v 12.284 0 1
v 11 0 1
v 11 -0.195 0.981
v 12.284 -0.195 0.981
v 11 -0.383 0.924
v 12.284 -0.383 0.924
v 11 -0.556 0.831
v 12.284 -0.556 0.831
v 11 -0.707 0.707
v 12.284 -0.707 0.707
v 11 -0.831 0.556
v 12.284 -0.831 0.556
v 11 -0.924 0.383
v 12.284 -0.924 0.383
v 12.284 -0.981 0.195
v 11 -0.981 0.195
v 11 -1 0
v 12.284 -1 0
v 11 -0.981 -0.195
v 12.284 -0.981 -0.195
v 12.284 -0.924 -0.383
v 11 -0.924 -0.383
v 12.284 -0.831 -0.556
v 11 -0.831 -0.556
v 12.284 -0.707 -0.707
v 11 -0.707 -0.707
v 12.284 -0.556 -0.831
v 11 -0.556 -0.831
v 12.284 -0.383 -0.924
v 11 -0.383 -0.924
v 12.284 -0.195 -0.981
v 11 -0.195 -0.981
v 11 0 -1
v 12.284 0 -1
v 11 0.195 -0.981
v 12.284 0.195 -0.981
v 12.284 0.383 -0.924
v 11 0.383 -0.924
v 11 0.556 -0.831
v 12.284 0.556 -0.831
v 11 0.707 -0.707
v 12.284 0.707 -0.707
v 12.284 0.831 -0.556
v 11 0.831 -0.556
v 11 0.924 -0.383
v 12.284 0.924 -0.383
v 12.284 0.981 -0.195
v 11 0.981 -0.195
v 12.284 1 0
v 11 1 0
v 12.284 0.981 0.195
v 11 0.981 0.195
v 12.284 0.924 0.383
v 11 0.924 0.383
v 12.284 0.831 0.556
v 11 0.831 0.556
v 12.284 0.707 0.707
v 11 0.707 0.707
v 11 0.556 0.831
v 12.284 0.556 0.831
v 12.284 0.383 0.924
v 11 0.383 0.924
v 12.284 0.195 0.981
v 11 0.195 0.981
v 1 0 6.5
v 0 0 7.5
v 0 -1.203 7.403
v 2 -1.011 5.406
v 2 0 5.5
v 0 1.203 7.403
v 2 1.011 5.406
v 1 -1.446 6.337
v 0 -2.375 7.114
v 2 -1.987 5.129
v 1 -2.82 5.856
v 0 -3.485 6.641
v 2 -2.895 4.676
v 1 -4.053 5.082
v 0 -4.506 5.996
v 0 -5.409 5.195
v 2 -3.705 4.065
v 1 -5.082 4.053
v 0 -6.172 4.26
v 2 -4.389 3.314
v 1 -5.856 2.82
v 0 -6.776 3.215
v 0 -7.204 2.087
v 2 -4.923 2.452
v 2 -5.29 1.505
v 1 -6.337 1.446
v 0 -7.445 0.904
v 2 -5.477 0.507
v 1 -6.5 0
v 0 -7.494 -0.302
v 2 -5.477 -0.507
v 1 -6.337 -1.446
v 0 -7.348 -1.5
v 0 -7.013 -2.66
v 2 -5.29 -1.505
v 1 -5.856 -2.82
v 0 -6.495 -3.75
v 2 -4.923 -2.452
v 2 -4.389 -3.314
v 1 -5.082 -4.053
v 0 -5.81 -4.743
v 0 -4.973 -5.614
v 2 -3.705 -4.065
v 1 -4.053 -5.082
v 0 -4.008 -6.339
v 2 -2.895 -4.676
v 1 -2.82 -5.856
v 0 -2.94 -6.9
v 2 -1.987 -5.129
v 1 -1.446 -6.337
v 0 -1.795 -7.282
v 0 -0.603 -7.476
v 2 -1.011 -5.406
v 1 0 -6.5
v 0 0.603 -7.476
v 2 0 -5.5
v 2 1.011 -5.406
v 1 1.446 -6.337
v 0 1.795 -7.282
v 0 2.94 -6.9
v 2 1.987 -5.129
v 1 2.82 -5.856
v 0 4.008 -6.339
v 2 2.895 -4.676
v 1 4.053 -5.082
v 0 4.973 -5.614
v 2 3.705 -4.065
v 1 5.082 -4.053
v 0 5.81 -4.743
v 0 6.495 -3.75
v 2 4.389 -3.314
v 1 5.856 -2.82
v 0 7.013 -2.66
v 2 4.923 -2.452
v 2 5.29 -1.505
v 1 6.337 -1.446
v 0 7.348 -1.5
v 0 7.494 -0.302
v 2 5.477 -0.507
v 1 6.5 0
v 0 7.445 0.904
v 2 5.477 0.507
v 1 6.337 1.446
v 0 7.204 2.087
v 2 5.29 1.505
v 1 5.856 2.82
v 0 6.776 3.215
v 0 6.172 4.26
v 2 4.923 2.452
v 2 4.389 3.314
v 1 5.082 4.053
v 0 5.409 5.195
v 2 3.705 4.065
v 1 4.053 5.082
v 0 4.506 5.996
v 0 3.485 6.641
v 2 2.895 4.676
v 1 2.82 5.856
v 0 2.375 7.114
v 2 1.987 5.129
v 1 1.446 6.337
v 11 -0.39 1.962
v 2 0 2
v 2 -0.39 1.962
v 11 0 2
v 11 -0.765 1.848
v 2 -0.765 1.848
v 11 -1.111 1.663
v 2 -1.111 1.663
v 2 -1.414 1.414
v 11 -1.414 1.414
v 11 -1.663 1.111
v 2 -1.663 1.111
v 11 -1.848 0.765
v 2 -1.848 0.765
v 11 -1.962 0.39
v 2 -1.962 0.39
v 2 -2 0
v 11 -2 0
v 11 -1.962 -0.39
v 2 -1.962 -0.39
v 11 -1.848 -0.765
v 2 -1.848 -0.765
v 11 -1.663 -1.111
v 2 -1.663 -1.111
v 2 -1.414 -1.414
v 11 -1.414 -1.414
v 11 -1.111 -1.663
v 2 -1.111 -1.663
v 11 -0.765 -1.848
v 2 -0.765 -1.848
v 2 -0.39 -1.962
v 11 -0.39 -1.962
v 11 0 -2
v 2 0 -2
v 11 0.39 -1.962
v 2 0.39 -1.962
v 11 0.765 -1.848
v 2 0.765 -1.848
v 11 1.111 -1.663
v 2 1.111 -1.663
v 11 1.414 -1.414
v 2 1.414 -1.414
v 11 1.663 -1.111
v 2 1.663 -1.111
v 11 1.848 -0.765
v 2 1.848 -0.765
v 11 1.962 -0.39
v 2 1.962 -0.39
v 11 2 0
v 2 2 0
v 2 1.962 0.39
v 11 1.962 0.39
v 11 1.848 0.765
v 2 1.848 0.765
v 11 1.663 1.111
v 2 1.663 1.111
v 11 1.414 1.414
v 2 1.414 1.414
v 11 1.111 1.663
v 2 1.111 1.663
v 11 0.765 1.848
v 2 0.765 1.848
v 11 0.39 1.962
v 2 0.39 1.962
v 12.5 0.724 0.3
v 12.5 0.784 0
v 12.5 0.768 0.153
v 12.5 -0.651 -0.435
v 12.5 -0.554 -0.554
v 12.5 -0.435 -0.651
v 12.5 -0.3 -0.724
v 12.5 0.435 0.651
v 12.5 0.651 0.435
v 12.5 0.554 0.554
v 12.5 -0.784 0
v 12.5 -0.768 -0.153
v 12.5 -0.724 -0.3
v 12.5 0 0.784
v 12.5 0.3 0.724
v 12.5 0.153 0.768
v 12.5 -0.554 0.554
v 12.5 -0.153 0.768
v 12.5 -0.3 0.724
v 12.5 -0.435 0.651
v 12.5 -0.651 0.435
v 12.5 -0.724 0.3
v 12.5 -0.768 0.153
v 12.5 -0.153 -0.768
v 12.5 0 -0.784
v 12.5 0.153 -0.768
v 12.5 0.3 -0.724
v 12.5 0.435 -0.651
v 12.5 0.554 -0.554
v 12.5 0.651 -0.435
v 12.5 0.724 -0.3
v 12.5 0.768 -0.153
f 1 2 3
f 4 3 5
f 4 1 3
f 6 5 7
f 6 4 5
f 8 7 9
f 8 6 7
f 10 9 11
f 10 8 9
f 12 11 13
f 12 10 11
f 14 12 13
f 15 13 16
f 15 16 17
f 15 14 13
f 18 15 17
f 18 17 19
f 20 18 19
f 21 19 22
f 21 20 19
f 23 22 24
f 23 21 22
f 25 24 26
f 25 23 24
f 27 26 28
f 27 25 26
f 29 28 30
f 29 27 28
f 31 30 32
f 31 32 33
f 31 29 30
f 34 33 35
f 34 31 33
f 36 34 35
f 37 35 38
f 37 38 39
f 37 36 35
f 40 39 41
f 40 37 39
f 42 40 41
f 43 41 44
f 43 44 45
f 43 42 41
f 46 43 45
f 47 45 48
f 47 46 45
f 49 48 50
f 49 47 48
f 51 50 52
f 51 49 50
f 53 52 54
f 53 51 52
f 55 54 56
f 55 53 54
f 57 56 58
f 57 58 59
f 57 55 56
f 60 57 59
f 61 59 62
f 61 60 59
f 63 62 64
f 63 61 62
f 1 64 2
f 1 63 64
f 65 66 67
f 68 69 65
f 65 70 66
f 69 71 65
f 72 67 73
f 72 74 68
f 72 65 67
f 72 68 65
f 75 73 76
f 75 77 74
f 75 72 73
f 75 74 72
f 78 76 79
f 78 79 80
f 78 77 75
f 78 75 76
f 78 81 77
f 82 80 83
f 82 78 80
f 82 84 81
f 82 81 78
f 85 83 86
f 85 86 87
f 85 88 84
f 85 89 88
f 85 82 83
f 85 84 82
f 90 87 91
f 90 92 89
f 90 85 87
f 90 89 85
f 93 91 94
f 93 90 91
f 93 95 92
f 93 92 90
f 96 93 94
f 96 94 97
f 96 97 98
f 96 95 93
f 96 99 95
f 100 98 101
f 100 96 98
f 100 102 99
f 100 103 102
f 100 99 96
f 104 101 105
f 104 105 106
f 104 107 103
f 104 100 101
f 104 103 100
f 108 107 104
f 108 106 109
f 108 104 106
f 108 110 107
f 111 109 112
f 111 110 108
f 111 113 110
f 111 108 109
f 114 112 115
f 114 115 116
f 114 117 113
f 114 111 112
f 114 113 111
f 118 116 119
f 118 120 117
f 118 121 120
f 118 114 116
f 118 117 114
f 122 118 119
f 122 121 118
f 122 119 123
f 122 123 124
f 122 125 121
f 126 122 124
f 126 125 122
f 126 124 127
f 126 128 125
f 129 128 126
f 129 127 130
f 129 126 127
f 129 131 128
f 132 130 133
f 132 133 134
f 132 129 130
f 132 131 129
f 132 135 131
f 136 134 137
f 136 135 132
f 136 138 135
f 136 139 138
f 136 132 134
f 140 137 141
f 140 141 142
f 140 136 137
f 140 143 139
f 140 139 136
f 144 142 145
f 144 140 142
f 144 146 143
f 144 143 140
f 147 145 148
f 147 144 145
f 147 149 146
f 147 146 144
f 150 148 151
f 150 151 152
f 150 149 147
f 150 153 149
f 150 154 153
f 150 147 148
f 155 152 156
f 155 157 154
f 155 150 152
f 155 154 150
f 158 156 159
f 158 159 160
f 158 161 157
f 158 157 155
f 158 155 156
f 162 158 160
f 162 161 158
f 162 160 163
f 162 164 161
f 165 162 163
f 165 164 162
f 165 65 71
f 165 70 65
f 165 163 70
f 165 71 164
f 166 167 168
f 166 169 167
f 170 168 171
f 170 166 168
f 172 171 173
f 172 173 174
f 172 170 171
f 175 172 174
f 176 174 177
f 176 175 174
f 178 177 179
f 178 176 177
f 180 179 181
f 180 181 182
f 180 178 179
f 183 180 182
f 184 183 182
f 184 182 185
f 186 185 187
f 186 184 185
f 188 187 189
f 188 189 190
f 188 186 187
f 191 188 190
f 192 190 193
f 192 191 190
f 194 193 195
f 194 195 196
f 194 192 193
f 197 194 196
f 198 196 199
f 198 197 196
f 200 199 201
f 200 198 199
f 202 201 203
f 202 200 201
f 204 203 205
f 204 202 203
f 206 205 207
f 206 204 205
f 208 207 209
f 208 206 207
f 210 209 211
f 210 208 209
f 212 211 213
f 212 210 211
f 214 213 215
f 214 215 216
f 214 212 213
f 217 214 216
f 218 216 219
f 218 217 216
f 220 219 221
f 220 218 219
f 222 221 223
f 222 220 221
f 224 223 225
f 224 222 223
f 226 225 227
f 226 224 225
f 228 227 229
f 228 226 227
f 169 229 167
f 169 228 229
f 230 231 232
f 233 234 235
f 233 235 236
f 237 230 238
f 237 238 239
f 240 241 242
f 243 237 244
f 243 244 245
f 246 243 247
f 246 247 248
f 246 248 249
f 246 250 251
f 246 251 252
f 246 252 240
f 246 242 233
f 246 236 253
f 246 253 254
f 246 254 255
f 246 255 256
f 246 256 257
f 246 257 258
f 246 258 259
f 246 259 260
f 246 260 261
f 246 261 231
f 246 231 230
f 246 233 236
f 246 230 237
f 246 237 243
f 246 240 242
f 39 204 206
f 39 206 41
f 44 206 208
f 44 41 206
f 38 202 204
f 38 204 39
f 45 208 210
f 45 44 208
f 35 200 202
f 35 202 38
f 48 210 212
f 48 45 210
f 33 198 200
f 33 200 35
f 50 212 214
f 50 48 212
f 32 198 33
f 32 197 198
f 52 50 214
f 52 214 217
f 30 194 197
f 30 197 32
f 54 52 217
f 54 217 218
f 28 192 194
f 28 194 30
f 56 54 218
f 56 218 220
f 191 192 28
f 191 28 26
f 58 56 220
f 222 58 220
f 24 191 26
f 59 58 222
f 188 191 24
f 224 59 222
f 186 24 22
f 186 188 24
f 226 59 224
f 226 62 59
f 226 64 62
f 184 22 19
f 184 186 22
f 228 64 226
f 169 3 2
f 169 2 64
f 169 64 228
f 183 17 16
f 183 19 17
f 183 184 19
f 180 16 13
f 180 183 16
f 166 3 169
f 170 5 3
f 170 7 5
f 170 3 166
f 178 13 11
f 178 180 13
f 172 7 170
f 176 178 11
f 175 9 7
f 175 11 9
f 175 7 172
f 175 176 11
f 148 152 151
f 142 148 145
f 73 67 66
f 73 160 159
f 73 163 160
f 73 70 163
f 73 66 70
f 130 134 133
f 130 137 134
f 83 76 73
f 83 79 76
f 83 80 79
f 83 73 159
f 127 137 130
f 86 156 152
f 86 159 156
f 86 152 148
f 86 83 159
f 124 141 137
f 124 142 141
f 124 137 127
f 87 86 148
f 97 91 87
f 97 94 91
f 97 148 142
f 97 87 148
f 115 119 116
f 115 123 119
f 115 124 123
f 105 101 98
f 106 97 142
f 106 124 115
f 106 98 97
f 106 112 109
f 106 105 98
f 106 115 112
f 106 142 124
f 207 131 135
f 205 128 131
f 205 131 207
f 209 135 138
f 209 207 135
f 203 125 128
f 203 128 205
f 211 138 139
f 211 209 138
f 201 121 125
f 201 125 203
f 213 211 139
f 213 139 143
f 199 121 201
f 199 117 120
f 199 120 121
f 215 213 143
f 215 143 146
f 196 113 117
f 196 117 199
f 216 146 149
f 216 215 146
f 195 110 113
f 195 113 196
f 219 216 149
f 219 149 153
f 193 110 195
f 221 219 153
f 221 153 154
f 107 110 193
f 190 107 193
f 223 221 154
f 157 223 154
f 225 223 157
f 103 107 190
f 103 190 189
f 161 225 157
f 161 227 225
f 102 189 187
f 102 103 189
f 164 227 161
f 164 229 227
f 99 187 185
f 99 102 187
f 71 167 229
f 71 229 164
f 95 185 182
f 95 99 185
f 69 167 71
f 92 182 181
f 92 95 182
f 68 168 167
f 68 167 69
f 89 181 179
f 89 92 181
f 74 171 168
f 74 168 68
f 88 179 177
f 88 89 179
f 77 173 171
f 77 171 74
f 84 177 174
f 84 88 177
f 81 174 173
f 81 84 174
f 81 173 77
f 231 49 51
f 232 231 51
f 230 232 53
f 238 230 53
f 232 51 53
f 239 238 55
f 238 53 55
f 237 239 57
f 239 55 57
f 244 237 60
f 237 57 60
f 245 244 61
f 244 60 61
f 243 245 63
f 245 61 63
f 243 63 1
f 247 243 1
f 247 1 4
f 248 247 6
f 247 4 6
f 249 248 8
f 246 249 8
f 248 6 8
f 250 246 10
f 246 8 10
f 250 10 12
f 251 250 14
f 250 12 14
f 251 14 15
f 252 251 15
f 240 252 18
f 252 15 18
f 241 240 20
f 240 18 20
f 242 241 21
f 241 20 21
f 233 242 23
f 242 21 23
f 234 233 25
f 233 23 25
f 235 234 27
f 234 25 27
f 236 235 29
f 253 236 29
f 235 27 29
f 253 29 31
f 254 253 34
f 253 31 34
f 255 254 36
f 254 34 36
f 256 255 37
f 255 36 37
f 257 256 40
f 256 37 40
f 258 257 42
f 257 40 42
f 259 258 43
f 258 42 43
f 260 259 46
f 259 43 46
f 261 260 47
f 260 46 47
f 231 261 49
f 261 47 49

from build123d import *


# Read off the part's stored shape, not the designer's step: M2 机械螺纹 螺柱1
with BuildPart() as part:
    # 草图1 → 旋转1 (revolve)
    with BuildSketch(Plane.XY, mode=Mode.PRIVATE) as revolve_1_sk:
        Polygon((0, 0), (0, 7.5), (2, 5.5), (2, 2), (11, 2), (11, 1), (12.5, 1), (12.5, 0), align=None)
    revolve(revolve_1_sk.sketch.rotate(Axis((0, 0, 0), (1, 0, 0)), 90), axis=Axis((0, 0, 0), (1, 0, 0)))

    # M2 机械螺纹 螺柱1 outline → M2 机械螺纹 螺柱1 (revolve, cut)
    with BuildSketch(Plane.YX):
        Polygon((1, 12.5), (0.7835, 12.5), (1, 12.2835), align=None)
    revolve(axis=Axis((0, 0, 0), (1, 0, 0)), mode=Mode.SUBTRACT)


solid = part.part
